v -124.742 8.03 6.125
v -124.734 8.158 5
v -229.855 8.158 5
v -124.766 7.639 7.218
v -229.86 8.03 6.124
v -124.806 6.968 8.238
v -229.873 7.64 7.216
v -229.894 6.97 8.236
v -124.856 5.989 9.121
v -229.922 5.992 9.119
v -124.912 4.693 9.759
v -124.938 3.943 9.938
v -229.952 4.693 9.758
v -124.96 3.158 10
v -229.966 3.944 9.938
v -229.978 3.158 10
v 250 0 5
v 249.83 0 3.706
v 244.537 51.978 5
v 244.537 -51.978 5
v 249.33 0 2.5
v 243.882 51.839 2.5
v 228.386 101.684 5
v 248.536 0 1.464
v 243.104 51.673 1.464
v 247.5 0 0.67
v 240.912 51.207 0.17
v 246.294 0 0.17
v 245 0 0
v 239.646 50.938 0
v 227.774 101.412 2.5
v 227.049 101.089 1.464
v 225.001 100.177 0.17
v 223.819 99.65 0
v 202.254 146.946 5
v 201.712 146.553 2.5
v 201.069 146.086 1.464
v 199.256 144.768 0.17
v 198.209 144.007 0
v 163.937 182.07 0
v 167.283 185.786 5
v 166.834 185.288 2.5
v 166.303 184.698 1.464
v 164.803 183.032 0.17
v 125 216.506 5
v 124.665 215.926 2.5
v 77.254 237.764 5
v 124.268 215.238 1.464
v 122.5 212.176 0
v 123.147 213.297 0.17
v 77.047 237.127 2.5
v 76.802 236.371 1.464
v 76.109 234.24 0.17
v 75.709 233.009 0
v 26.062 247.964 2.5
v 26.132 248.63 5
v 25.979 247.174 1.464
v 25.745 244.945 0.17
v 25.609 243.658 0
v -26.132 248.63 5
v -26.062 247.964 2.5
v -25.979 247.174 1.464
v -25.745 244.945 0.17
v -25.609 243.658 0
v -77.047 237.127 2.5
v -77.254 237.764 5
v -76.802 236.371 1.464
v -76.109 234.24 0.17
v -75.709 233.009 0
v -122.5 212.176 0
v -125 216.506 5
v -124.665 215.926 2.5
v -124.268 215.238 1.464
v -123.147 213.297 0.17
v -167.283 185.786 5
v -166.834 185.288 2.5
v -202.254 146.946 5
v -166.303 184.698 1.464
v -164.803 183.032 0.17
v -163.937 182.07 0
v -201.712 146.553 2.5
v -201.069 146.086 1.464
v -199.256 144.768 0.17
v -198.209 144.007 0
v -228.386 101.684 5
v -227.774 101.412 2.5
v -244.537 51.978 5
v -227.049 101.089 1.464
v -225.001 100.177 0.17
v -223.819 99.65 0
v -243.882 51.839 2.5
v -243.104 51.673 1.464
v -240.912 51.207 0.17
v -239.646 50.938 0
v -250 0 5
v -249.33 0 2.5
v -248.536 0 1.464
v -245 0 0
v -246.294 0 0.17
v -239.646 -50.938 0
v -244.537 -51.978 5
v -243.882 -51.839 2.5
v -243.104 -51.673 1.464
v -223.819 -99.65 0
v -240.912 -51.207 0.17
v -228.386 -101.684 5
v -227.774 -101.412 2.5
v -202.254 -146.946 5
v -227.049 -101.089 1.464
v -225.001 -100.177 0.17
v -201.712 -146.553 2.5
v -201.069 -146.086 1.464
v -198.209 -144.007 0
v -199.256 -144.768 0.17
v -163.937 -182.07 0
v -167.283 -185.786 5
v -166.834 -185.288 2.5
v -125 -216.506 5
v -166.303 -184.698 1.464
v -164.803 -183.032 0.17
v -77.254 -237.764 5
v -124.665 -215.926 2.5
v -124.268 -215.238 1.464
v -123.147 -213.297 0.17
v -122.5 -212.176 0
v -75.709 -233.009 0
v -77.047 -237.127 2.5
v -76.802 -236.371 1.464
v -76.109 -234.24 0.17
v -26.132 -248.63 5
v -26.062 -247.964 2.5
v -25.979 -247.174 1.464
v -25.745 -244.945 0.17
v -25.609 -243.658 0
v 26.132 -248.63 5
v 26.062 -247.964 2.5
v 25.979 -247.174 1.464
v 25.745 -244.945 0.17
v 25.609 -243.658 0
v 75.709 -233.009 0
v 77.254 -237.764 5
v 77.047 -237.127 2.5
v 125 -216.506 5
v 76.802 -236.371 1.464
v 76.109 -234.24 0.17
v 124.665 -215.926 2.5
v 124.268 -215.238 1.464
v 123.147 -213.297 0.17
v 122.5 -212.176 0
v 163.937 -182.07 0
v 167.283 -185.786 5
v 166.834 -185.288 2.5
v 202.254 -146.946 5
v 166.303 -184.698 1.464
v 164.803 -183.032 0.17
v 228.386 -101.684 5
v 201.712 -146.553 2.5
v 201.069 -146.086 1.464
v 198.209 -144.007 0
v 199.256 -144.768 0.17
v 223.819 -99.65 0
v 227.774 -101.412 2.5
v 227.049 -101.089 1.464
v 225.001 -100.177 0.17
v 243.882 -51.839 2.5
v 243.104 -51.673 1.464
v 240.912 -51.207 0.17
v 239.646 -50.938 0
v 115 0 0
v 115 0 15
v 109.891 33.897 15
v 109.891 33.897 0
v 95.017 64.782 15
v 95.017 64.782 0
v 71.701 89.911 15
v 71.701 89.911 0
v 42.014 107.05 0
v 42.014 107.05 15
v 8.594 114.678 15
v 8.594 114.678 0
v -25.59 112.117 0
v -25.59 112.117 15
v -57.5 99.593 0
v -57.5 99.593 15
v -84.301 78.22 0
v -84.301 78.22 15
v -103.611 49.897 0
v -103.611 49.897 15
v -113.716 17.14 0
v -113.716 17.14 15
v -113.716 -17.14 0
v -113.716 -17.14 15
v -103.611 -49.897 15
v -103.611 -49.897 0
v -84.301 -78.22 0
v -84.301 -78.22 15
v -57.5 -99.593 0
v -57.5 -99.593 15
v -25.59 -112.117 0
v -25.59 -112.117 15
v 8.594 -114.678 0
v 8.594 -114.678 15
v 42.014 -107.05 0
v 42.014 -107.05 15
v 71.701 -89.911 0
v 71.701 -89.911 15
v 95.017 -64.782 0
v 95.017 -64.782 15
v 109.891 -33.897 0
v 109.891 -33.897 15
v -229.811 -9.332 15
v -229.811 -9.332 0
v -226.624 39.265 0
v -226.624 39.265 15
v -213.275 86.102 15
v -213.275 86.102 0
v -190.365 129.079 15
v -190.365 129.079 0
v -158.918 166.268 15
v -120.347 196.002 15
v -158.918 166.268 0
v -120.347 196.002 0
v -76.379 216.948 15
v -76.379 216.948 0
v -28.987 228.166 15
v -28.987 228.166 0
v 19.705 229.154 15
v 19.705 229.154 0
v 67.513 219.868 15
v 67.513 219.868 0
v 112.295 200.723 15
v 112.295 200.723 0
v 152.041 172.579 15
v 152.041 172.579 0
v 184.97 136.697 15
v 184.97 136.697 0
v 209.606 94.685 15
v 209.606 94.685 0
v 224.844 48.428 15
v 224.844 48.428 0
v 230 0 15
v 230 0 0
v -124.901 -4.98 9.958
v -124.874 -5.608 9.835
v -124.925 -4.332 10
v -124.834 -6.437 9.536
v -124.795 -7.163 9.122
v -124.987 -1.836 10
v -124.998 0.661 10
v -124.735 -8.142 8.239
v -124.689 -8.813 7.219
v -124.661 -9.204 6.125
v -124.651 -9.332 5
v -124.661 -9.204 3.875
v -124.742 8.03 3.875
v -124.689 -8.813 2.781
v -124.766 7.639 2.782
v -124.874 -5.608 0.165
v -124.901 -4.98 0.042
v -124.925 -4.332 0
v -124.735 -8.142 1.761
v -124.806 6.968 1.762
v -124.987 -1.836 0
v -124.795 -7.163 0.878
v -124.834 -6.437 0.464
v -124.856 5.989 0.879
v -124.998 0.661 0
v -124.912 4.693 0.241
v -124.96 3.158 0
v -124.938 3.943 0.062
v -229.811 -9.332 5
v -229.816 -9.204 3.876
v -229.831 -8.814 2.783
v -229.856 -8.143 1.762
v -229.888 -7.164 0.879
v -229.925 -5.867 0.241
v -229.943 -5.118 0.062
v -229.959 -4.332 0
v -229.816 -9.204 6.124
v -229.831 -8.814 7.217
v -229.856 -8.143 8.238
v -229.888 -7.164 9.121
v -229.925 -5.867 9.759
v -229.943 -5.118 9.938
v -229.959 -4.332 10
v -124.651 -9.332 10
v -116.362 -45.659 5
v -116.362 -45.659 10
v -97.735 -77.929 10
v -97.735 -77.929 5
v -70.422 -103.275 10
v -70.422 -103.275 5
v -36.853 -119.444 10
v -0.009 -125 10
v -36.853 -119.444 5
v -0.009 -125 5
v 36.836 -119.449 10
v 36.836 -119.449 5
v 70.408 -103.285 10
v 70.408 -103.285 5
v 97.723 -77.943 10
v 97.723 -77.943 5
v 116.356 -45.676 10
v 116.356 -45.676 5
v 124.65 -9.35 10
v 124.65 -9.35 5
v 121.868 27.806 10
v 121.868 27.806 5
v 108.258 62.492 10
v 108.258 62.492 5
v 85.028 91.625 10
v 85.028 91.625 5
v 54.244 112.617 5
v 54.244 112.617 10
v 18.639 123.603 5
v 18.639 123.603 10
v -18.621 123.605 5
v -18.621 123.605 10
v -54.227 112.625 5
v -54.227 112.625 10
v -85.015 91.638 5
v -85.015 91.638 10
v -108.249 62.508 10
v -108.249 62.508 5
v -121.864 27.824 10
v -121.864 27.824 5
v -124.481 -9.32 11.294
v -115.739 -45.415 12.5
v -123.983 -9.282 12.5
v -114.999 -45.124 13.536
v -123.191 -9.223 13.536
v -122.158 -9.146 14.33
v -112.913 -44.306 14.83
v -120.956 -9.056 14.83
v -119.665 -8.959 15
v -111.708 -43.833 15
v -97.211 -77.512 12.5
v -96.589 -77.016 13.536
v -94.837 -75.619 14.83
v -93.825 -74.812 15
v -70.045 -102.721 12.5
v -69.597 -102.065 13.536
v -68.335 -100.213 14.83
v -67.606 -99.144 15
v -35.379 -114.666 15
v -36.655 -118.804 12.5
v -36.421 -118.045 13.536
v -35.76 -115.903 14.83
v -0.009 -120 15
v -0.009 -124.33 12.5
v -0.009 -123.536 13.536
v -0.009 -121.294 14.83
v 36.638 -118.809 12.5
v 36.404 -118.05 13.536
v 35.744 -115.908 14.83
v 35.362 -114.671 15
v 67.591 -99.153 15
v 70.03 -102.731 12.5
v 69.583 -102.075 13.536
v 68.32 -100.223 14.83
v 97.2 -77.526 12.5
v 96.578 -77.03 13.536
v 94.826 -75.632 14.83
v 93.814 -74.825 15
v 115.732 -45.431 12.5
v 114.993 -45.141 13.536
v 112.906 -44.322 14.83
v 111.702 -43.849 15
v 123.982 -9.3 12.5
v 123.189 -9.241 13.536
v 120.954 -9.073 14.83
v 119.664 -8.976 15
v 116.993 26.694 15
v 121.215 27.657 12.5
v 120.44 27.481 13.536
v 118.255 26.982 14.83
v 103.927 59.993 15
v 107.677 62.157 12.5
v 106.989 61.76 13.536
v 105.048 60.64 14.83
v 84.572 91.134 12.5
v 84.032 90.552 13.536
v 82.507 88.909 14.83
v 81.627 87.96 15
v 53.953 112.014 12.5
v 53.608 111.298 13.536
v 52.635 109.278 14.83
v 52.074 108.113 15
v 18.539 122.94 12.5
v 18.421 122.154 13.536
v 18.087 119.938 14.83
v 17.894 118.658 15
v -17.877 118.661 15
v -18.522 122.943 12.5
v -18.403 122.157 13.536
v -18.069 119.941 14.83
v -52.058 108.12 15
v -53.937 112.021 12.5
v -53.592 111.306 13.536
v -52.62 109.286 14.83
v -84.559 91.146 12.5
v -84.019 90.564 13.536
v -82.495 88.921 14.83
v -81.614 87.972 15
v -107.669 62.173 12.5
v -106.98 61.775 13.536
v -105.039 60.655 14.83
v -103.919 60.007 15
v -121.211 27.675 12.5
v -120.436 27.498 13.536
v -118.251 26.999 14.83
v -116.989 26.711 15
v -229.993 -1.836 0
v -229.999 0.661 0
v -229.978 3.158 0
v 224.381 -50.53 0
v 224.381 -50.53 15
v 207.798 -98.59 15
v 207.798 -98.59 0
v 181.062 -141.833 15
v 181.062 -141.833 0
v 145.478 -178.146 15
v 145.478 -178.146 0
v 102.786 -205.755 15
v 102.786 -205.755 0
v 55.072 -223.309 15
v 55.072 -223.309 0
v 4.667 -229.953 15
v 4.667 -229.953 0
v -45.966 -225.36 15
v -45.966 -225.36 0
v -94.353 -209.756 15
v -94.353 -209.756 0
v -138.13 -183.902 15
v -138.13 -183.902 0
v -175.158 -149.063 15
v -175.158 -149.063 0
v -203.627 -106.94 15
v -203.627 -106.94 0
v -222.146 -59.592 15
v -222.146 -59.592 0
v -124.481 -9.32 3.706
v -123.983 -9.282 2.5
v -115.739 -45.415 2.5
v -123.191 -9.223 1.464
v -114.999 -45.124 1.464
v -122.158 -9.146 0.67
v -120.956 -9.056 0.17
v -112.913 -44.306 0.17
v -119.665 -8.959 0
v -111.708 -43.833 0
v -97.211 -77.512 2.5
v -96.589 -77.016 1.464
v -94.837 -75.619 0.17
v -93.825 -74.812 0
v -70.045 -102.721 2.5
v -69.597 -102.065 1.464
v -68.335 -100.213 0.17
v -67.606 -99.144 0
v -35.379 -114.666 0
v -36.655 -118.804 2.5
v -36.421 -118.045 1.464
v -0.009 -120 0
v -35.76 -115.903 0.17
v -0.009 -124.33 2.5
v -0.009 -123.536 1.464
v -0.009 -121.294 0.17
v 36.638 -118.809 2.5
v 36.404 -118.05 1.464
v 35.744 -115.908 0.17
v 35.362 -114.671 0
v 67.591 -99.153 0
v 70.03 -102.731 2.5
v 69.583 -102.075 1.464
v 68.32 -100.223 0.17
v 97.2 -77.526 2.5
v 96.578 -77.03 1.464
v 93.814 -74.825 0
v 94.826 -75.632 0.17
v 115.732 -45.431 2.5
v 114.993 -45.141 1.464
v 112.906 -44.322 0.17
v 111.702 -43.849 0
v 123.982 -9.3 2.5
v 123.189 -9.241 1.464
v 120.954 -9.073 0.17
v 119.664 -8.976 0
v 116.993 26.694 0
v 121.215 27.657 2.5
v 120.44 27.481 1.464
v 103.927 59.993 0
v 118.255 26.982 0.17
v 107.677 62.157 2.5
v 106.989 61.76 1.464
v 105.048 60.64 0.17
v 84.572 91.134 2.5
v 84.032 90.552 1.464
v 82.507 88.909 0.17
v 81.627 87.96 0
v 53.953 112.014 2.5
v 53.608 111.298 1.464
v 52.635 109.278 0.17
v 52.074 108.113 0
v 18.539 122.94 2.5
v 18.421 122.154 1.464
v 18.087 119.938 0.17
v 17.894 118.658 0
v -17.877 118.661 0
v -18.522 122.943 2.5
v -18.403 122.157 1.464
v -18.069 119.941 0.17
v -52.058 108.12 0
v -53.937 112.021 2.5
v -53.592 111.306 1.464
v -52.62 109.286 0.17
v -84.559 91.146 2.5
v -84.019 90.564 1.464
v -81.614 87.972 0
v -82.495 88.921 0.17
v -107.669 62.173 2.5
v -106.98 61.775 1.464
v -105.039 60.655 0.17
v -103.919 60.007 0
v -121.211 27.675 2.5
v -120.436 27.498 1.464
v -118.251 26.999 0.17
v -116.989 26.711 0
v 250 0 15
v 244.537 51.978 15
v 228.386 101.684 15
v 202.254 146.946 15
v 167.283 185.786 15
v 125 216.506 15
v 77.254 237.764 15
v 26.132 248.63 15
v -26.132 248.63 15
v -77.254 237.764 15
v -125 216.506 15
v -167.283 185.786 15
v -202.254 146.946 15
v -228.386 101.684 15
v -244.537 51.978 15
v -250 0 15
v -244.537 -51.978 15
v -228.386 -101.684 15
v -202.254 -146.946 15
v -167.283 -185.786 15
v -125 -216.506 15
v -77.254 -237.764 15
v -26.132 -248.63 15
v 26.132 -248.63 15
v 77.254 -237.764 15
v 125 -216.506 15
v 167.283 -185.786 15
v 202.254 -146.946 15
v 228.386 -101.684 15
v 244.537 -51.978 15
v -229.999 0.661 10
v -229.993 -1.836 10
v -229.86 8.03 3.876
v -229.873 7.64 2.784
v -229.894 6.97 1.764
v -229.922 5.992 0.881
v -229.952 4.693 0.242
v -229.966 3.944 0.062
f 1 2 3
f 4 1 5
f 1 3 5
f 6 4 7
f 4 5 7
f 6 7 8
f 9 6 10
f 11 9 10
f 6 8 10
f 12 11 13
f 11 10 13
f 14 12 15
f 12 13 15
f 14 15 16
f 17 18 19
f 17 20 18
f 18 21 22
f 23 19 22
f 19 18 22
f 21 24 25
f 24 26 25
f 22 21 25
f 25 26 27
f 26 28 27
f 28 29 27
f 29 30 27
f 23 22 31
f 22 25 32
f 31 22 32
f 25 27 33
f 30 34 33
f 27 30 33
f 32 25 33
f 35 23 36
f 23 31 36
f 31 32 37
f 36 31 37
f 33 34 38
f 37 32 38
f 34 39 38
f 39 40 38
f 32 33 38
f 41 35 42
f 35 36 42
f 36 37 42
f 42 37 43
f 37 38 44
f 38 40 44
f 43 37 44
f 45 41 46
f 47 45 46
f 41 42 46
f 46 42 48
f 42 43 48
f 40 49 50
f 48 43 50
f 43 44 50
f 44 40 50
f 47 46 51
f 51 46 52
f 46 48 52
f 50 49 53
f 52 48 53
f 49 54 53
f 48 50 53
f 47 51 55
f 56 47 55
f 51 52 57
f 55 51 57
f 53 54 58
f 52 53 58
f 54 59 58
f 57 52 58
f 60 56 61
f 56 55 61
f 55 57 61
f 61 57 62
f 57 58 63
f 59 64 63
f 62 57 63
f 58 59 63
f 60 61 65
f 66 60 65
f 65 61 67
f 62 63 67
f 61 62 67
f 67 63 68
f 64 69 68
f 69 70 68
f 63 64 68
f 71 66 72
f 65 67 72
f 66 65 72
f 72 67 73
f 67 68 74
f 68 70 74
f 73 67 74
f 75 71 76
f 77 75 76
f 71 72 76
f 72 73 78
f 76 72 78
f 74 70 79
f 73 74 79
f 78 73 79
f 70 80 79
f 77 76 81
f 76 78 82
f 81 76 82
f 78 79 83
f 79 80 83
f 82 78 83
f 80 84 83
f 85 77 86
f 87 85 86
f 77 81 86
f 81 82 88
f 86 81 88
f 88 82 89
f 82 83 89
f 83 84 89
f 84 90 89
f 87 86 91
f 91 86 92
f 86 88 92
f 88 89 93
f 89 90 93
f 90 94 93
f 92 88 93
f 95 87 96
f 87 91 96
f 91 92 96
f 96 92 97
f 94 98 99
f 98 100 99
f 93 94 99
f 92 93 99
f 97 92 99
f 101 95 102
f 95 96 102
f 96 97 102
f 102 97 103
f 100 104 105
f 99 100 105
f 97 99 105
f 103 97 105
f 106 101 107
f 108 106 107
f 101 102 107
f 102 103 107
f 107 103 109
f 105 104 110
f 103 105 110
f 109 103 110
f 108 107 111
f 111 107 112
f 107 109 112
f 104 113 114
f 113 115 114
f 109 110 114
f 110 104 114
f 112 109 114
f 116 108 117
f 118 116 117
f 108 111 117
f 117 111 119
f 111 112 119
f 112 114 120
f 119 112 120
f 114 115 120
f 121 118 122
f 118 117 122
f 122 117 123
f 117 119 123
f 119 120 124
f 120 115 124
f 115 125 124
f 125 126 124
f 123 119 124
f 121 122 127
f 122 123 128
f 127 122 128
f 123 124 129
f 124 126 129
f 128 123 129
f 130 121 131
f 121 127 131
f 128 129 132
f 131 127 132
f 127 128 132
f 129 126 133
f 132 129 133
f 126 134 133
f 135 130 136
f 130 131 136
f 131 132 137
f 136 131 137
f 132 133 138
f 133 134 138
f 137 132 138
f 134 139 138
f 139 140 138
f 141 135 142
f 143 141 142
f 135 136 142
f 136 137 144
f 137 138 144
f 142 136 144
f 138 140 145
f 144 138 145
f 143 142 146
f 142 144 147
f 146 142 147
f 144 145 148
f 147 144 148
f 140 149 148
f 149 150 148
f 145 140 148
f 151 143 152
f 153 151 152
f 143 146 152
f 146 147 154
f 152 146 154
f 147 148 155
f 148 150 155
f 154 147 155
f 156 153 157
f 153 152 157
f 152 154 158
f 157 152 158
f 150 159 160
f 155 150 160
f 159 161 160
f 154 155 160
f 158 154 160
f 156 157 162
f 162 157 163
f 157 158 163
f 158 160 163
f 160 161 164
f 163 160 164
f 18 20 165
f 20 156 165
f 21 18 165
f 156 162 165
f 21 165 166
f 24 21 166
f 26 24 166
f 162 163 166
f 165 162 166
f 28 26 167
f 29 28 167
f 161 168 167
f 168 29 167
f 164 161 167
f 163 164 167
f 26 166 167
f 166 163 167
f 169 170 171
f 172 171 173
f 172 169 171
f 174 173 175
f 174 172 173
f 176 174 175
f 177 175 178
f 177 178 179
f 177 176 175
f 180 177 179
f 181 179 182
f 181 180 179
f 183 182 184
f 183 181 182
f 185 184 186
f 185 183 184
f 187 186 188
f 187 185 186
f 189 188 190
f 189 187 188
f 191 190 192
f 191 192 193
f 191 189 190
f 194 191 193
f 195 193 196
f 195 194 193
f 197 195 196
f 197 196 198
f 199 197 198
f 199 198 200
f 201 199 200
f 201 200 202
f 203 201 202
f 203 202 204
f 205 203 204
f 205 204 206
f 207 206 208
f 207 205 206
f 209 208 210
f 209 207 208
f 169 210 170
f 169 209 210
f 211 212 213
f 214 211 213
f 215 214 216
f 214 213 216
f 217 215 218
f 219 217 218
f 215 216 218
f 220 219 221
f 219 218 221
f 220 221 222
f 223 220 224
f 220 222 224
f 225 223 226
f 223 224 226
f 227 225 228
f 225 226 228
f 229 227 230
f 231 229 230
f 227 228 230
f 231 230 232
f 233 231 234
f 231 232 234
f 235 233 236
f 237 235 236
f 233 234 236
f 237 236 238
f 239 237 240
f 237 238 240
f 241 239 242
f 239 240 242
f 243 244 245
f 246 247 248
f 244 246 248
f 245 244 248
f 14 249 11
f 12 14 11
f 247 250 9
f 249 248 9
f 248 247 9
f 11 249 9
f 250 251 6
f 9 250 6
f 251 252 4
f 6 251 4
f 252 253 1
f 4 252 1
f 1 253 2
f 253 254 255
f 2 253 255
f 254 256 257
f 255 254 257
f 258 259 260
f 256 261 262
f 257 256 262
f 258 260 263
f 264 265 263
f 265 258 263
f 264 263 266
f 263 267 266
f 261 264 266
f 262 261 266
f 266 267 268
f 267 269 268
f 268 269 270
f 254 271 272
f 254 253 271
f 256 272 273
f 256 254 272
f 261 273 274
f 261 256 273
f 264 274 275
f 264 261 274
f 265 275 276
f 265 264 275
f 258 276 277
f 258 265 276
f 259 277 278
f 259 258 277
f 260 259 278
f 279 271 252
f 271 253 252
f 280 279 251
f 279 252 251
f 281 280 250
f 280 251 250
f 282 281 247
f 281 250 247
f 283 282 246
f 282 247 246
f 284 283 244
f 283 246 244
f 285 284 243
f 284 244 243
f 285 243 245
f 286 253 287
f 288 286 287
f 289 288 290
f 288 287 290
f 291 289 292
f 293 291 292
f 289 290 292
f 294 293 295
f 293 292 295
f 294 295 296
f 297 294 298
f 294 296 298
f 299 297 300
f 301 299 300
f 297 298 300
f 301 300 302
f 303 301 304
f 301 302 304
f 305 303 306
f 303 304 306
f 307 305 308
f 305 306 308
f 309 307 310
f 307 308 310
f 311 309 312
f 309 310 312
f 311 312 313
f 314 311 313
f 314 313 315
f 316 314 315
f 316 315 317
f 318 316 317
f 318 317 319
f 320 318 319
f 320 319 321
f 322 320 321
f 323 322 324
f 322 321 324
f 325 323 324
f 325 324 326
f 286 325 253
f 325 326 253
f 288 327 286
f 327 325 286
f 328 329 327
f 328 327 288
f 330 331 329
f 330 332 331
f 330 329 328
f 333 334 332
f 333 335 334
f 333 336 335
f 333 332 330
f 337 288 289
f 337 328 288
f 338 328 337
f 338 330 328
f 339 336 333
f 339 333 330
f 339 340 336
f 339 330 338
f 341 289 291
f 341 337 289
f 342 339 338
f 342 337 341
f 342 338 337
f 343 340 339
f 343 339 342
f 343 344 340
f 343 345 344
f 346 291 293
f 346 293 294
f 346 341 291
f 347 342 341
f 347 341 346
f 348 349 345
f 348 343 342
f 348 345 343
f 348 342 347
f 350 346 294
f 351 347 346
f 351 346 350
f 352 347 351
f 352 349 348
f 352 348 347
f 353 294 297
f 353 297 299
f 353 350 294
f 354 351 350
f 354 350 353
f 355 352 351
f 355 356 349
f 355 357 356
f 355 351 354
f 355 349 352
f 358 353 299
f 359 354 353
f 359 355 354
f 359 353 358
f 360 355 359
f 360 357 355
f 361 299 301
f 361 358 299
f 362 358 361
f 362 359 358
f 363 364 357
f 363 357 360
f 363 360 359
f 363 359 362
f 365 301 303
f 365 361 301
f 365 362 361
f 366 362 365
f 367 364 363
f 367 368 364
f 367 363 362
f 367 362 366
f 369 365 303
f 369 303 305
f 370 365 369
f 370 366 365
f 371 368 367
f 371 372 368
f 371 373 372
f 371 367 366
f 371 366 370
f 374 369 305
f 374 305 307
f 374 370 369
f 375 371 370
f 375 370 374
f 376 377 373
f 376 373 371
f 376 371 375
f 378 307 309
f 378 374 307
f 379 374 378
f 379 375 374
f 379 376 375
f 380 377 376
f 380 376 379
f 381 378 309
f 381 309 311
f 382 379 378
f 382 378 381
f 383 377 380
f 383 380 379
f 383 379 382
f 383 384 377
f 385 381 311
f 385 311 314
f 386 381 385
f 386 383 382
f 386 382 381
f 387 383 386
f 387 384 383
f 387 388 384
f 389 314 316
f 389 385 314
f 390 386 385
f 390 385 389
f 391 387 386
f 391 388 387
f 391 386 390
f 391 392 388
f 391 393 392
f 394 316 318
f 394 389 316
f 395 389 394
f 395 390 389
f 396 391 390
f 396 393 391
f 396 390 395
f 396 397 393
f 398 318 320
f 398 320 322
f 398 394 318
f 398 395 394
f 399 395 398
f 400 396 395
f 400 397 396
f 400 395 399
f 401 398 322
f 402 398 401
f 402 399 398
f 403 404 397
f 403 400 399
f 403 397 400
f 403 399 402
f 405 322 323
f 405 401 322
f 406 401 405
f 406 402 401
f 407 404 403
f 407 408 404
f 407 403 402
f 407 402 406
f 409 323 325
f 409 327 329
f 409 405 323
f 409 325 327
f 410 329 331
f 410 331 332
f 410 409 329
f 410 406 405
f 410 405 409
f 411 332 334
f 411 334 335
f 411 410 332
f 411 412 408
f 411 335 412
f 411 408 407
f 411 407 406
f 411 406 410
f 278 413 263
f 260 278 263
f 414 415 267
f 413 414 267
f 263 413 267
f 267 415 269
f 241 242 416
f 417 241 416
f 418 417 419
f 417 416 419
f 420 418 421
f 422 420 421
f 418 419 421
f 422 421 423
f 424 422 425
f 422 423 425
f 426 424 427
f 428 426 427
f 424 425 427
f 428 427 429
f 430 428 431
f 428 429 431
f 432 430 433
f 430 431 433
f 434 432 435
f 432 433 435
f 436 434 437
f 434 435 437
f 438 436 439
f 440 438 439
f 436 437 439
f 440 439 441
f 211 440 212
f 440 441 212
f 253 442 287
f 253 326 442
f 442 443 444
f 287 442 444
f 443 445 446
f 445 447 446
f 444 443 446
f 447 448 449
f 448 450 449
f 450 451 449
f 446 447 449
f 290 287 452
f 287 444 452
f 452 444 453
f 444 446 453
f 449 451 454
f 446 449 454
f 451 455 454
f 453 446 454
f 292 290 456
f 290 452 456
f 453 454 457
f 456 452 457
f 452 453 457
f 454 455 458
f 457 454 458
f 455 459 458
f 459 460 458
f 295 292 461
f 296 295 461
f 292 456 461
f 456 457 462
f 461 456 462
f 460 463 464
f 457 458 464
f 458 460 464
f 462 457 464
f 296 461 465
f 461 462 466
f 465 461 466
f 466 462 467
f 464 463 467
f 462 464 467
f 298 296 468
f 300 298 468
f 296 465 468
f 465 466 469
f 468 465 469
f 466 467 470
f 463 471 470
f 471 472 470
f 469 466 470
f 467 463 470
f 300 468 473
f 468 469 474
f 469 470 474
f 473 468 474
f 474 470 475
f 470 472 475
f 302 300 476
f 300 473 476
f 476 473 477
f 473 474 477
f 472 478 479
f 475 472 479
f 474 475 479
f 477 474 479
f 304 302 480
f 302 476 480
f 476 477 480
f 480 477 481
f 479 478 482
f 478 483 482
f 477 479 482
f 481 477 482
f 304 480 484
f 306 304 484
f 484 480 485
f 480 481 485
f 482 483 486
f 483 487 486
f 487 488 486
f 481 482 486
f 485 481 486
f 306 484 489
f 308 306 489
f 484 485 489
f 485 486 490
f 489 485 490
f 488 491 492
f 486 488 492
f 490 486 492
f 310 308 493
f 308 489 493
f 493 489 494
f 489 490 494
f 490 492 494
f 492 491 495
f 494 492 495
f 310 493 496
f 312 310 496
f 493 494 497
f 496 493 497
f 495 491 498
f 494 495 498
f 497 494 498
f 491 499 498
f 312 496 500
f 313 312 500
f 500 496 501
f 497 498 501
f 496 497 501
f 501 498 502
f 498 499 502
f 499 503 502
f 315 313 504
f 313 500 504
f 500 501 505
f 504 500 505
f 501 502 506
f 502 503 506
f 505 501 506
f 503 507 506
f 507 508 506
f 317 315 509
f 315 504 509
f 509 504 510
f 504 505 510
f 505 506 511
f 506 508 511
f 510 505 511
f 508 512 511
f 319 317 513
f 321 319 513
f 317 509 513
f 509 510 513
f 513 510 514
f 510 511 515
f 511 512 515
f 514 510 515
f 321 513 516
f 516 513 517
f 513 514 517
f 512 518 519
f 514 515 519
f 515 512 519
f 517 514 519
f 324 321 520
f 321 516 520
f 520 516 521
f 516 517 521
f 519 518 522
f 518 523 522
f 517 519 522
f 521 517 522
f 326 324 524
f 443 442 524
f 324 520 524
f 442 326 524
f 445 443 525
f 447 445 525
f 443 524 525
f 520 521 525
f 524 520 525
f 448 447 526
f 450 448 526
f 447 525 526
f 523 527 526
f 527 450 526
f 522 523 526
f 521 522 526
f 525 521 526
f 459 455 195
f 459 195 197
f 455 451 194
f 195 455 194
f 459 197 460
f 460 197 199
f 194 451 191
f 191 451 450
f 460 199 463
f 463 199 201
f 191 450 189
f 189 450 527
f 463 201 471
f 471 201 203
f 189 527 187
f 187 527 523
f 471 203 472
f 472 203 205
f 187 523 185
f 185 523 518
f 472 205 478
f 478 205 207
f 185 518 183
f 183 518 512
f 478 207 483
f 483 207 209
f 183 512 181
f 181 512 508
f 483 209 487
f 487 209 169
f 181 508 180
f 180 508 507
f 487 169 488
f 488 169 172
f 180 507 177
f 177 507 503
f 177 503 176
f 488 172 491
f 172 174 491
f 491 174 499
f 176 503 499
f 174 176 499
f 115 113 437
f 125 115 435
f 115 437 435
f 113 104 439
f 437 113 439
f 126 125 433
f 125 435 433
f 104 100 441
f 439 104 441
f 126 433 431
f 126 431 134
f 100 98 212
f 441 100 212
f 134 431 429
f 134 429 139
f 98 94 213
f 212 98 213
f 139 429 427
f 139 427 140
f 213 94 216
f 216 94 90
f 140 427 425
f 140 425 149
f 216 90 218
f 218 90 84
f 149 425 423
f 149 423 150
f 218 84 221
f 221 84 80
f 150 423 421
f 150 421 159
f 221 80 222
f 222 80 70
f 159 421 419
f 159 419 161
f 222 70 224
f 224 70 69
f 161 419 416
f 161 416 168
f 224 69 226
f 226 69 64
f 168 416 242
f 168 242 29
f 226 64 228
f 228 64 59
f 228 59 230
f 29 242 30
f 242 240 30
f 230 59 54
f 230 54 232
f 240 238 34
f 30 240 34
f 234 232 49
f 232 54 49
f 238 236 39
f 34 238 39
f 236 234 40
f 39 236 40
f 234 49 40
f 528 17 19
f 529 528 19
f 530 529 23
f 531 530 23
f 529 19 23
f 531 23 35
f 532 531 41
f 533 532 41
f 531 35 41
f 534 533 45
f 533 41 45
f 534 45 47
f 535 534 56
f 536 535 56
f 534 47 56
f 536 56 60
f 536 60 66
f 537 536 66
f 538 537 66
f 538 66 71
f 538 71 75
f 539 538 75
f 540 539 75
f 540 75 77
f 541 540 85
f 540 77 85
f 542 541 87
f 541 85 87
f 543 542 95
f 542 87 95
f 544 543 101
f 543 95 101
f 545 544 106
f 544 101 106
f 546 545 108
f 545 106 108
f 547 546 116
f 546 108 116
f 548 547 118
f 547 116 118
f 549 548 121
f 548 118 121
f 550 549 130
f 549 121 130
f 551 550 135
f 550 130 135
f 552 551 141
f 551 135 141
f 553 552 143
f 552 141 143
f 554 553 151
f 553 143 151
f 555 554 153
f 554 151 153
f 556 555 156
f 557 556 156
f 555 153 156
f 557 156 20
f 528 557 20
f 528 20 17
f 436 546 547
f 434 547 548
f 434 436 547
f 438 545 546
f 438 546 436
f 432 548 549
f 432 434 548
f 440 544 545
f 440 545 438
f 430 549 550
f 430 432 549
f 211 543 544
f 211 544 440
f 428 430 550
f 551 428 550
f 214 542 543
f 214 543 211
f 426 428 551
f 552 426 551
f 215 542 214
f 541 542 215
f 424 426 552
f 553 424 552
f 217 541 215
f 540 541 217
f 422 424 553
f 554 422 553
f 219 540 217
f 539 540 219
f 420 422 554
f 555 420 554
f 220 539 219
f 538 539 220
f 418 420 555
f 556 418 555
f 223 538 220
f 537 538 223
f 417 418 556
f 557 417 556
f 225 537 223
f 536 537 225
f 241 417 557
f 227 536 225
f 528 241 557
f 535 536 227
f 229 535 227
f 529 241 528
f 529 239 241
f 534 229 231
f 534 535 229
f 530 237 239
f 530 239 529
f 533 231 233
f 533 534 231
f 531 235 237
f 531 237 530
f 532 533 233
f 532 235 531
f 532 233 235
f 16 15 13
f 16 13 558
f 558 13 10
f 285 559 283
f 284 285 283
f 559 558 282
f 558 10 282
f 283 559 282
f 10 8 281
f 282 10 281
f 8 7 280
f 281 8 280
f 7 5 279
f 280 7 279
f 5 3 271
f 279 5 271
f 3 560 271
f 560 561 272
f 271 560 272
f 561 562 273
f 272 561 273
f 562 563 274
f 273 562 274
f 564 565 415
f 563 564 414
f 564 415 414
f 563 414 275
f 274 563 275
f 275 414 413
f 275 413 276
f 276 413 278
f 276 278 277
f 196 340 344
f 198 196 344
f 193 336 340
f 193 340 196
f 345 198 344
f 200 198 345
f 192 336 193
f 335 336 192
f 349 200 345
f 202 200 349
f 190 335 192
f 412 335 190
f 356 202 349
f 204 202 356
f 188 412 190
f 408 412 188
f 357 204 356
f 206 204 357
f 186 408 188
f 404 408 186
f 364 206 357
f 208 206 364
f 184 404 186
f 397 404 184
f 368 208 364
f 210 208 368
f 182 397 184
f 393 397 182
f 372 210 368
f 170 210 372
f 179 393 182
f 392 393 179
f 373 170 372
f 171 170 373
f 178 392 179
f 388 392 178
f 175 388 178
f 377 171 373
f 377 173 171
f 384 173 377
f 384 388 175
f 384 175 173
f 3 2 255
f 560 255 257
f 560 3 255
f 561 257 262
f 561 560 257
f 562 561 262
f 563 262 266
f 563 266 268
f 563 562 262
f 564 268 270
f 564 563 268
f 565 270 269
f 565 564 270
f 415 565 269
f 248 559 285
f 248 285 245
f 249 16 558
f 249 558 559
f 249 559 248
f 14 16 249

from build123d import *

# Parameters (mm, degrees)
F0_R     = 250
F1_DEPTH = 15
F0_R_2   = 115
F2_DEPTH = 10
F3_R     = 4.99999
F3_2_R   = 4.99999
F3_3_R   = 4.99999


# Not quite as in the source:
# - a fillet or chamfer is up to 0.001 mm smaller than in the source, because OpenCascade refuses the exact size


with BuildPart() as f1:
    # F0 (on Top) → F1 (new body)
    with BuildSketch(Plane.XY):
        Circle(F0_R)
        with BuildLine():
            ThreePointArc((-229.8105899104, -9.3323504552), (-229.9992492988, -0.5876410446), (-229.8552770118, 8.1579182297))
            ThreePointArc((-229.8552770118, 8.1579182297), (4.0796009175, 229.9638164067), (230, 0))
            ThreePointArc((230, 0), (4.667136199, -229.9526426021), (-229.8105899104, -9.3323504552))
        make_face(mode=Mode.SUBTRACT)
    extrude(amount=F1_DEPTH)

    # F3#2 (radius 5 in the source; OpenCascade refuses exactly that, so slightly less here)
    f3_2_edges = [f1.edges().sort_by_distance(p)[0] for p in [
        (-250, 0, 0),
    ]]
    fillet(f3_2_edges, radius=F3_2_R)


with BuildPart() as f1b:
    # F0 (on Top) → F1, piece 2 (new body)
    with BuildSketch(Plane.XY):
        with BuildLine():
            ThreePointArc((-124.6511421327, -9.3323504552), (4.6694343027, -124.9127550865), (125, 0))
            ThreePointArc((125, 0), (4.0811348629, 124.9333595891), (-124.7335094117, 8.1579182297))
            ThreePointArc((-124.7335094117, 8.1579182297), (-124.9986139169, -0.5886585218), (-124.6511421327, -9.3323504552))
        make_face()
        Circle(F0_R_2, mode=Mode.SUBTRACT)
    extrude(amount=F1_DEPTH)

    # F3#3 (radius 5 in the source; OpenCascade refuses exactly that, so slightly less here)
    f3_3_edges = [f1b.edges().sort_by_distance(p)[0] for p in [
        (-124.998614, -0.588659, 0),
        (-125, 0, 15),
    ]]
    fillet(f3_3_edges, radius=F3_3_R)


with BuildPart() as f2:
    # F0 (on Top) → F2 (new body)
    with BuildSketch(Plane.XY):
        with BuildLine():
            ThreePointArc((-124.6511421327, -9.3323504552), (-124.9986139169, -0.5886585218), (-124.7335094117, 8.1579182297))
            Line((-124.7335094117, 8.1579182297), (-229.8552770118, 8.1579182297))
            ThreePointArc((-229.8552770118, 8.1579182297), (-229.9992492988, -0.5876410446), (-229.8105899104, -9.3323504552))
            Line((-229.8105899104, -9.3323504552), (-124.6511421327, -9.3323504552))
        make_face()
    extrude(amount=F2_DEPTH)

    # F3 (radius 5 in the source; OpenCascade refuses exactly that, so slightly less here)
    f3_edges = [f2.edges().sort_by_distance(p)[0] for p in [
        (-177.294393, 8.157918, 0),
        (-177.230866, -9.33235, 0),
        (-177.294393, 8.157918, 10),
        (-177.230866, -9.33235, 10),
    ]]
    fillet(f3_edges, radius=F3_R)


solid = Compound([f1.part, f1b.part, f2.part])
